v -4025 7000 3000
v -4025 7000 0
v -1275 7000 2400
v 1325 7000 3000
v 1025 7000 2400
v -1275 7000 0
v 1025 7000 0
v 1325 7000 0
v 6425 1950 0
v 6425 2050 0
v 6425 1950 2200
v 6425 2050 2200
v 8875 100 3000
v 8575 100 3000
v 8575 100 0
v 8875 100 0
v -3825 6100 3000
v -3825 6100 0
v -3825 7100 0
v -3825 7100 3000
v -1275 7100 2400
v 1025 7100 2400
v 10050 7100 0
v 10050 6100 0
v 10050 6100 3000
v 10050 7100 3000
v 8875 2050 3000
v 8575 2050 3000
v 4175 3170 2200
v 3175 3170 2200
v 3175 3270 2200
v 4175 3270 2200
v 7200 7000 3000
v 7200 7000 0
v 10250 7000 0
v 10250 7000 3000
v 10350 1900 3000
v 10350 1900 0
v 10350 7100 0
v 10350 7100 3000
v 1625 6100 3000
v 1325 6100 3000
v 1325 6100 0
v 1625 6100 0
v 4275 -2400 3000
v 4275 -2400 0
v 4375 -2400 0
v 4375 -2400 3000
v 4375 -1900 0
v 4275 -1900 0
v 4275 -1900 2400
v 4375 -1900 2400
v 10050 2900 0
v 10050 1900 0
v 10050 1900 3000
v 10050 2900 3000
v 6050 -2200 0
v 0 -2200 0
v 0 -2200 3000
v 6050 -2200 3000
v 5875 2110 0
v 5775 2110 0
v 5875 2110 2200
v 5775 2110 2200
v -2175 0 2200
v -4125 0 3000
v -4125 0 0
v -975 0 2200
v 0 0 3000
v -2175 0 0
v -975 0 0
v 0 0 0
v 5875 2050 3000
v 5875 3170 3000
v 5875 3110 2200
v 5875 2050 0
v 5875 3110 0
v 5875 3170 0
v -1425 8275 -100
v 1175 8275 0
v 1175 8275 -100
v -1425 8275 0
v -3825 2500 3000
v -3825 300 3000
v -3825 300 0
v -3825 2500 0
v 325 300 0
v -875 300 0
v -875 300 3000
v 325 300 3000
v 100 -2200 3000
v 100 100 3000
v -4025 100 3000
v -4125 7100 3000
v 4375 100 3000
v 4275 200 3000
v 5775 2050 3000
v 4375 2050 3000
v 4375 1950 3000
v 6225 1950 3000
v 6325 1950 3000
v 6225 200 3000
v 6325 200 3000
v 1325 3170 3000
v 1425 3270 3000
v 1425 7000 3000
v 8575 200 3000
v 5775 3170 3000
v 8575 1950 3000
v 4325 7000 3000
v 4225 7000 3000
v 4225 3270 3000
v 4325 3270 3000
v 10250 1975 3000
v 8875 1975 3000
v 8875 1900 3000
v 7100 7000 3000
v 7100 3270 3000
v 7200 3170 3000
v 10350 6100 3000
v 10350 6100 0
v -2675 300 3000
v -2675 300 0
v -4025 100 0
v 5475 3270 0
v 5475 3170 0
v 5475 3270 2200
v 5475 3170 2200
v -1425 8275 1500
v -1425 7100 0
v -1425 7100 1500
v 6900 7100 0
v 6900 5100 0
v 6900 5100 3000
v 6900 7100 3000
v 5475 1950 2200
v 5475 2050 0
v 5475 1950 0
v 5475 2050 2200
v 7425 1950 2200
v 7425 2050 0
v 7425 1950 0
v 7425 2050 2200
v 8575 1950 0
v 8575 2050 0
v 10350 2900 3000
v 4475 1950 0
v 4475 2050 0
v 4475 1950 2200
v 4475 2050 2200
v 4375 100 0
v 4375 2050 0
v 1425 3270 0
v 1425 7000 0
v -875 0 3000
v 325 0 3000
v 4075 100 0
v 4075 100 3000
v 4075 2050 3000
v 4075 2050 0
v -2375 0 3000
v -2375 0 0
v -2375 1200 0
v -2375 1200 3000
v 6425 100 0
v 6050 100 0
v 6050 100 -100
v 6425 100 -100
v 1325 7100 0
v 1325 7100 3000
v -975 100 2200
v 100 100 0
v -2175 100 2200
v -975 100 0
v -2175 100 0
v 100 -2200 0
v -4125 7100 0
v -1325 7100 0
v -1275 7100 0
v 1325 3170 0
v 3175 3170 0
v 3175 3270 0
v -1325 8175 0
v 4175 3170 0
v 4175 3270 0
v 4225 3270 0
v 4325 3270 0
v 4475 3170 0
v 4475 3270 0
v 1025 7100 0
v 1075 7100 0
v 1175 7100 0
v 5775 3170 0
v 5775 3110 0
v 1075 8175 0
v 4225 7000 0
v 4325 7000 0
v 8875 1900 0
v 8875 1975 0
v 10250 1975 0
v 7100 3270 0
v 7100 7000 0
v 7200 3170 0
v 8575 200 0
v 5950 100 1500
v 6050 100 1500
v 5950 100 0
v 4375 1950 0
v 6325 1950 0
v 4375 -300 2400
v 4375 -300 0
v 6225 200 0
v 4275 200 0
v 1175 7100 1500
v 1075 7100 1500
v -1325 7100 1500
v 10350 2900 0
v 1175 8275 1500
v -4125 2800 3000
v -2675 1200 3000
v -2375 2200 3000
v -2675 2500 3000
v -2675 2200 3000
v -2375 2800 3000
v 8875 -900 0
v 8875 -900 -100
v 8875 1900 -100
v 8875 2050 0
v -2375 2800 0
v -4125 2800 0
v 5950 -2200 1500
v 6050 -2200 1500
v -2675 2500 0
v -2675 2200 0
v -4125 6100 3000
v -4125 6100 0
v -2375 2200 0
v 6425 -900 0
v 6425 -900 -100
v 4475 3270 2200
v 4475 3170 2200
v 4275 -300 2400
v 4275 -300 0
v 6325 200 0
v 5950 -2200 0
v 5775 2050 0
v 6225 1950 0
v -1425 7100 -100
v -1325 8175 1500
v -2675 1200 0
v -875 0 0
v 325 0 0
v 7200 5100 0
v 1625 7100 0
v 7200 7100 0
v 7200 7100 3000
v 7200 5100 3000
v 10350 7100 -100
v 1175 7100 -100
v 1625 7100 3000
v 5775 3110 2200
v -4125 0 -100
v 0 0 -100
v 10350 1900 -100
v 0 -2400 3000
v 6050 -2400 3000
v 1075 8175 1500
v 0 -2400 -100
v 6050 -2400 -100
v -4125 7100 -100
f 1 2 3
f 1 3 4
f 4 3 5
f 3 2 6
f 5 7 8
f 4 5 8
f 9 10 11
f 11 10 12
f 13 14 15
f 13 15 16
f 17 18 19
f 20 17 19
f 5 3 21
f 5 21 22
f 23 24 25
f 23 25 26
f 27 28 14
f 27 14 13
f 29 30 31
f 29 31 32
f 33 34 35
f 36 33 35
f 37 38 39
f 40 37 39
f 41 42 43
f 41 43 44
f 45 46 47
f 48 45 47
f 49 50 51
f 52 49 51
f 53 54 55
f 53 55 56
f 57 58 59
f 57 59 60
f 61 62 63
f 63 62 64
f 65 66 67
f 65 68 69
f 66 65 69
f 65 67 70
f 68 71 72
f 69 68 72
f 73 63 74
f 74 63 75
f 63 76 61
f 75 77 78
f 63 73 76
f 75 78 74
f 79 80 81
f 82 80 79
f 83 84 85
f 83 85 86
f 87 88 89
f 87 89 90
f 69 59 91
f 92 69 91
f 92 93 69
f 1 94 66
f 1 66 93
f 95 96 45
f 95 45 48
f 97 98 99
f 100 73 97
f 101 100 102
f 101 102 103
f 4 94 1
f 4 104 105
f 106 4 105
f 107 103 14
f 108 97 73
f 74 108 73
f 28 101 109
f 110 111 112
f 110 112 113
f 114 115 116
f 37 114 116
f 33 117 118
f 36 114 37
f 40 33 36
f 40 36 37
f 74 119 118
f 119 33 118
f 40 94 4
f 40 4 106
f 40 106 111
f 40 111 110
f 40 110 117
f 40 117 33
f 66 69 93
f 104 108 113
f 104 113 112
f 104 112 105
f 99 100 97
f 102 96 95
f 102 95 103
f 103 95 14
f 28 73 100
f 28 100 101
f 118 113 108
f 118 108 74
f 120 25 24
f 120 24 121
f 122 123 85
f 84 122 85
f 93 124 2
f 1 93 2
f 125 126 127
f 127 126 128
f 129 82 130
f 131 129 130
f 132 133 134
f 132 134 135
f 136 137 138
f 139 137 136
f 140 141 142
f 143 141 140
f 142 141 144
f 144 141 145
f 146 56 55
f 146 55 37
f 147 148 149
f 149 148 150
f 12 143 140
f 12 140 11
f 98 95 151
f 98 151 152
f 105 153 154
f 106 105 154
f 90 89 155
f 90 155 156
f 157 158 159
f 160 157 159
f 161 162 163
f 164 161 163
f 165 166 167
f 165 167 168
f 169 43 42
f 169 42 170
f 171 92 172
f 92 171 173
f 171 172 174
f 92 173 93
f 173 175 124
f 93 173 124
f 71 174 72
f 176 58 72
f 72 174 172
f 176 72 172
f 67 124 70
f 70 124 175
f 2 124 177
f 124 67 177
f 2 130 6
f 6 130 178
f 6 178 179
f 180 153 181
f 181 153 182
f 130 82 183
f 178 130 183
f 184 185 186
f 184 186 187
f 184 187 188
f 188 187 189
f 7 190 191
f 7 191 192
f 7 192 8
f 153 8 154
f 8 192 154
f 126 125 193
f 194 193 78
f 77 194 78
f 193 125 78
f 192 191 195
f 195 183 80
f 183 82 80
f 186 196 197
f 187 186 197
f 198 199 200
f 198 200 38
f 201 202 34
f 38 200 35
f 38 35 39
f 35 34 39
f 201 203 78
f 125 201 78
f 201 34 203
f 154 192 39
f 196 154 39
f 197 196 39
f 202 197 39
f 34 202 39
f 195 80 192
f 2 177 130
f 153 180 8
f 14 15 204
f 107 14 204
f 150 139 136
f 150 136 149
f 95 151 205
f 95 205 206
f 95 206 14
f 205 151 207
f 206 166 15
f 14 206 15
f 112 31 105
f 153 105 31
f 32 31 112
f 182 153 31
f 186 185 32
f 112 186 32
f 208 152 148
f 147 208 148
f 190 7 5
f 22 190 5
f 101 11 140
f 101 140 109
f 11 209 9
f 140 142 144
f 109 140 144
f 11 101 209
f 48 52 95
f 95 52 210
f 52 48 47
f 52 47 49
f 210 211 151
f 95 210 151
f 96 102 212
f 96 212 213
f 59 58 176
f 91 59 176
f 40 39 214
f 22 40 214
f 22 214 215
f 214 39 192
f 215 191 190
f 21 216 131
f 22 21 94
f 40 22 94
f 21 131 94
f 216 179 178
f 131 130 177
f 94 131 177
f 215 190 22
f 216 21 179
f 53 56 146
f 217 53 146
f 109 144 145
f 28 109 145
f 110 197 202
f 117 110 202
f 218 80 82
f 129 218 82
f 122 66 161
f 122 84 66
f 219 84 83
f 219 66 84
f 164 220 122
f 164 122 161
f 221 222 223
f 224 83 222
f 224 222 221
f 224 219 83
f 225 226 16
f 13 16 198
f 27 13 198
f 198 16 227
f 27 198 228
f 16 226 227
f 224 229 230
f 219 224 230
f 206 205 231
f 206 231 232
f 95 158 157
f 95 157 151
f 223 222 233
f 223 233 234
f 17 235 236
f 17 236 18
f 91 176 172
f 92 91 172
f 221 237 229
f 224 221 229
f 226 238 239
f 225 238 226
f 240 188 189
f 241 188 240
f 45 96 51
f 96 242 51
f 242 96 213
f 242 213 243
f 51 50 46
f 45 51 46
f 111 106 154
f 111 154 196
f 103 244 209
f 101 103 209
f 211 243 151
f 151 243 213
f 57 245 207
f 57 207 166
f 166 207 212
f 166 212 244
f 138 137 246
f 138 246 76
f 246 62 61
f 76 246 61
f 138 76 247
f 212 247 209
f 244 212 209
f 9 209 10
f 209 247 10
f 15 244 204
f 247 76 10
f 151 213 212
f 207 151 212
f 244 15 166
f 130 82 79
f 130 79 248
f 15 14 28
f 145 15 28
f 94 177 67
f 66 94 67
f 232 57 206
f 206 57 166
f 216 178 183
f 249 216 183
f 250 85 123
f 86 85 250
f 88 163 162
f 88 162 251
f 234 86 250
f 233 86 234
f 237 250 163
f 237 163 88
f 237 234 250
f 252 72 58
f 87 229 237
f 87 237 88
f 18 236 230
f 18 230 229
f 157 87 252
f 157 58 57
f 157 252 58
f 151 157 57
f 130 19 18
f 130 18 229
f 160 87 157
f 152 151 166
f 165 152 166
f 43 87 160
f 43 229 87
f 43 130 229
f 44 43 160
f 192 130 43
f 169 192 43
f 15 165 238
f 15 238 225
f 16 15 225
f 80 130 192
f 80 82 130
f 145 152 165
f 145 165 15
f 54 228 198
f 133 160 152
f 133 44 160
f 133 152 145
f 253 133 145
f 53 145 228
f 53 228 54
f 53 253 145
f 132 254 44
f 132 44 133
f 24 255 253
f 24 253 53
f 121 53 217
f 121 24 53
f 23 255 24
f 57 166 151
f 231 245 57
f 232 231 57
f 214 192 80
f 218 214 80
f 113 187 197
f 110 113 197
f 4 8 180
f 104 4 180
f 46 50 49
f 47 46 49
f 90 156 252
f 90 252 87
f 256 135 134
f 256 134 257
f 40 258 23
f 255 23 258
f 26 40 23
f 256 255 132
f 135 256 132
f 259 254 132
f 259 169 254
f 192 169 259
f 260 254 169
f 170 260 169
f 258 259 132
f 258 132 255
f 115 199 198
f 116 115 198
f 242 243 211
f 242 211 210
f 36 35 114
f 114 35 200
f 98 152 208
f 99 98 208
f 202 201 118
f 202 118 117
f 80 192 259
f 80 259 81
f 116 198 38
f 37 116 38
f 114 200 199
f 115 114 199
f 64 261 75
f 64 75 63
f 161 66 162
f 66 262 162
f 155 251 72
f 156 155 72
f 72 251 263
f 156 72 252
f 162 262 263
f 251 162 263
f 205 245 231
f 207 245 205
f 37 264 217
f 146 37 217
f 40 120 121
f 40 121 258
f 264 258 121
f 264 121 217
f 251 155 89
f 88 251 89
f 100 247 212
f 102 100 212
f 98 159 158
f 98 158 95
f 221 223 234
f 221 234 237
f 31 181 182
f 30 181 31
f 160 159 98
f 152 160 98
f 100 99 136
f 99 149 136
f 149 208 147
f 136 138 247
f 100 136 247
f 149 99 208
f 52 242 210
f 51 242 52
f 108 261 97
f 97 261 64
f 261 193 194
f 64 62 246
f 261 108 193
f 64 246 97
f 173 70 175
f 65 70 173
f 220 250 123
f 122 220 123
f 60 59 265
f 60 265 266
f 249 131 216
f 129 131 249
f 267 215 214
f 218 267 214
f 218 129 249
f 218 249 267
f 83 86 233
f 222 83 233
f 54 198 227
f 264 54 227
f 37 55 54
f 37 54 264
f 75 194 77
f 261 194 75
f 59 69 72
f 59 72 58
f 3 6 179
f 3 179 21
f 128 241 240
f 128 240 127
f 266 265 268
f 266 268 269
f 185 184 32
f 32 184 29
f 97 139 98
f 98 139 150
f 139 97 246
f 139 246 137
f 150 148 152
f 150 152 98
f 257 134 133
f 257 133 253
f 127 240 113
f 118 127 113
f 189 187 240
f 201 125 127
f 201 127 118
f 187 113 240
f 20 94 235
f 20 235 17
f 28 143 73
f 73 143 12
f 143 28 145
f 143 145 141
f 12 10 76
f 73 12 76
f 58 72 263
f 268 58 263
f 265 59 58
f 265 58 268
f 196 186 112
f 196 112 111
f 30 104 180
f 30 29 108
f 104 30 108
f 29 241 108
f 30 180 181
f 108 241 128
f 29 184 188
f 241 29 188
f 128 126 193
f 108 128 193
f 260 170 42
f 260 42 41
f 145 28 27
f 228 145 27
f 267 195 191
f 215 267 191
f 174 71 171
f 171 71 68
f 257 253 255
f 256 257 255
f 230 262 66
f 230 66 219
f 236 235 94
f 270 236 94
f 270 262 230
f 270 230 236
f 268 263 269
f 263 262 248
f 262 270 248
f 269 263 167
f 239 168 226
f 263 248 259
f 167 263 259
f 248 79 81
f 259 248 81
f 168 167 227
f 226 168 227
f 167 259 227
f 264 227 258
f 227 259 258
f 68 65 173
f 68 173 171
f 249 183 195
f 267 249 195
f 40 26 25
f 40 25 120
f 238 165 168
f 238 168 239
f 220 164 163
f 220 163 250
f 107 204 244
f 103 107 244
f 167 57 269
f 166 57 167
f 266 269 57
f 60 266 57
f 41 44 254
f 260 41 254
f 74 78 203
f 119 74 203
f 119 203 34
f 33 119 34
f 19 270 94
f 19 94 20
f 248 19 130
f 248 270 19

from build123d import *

# Parameters (mm, degrees)
F1_DEPTH  = 100
F3_DEPTH  = 3000
F4_W      = 300
F4_H      = 1000
F4_H_2    = 2000
F4_H_3    = 1950
F4_W_2    = 1200
F4_H_4    = 300
F4_W_3    = 6050
F4_H_5    = 200
F5_DEPTH  = 3000
F6_W      = 2750
F6_H      = 100
F7_DEPTH  = 3000
F8_W      = 2800
F8_H      = 3730
F8_W_2    = 2775
F9_DEPTH  = 3000
F10_W     = 1200
F10_H     = 2200
F11_DEPTH = 100
F12_W     = 1000
F12_H     = 2200
F13_DEPTH = 100
F14_W     = 1000
F14_H     = 2200
F15_DEPTH = 100
F16_W     = 1000
F16_H     = 2200
F17_DEPTH = 100
F18_W     = 1600
F18_H     = 2400
F19_DEPTH = 100
F20_W     = 2300
F20_H     = 2400
F21_DEPTH = 100
F22_W     = 100
F22_H     = 2300
F23_DEPTH = 1500


with BuildPart() as f1:
    # F0 (on Top) → F1 (new body)
    with BuildSketch(Plane.XY):
        Polygon((-4125, 0), (0, 0), (0, -2400), (6050, -2400), (6050, -900), (6050, 0), (6050, 100), (6425, 100), (6425, 0), (6425, -900), (8875, -900), (8875, 1900), (10350, 1900), (10350, 7100), (1175, 7100), (1175, 8275), (-1425, 8275), (-1425, 7100), (-4125, 7100), align=None)
    extrude(amount=-F1_DEPTH)

    # F2 (on face) → F3 (join)
    with BuildSketch(Plane.XY):
        Polygon((-4125, 2800), (-4125, 0), (-2375, 0), (-2375, 1200), (-2675, 1200), (-2675, 300), (-3825, 300), (-3825, 2500), (-2675, 2500), (-2675, 2200), (-2375, 2200), (-2375, 2800), align=None)
    extrude(amount=F3_DEPTH)

    # F4 (on face) → F5 (join)
    with BuildSketch(Plane.XY):
        with Locations((-3975, 6600)):
            Rectangle(F4_W, F4_H)
        with Locations((1475, 6600)):
            Rectangle(F4_W, F4_H)
        with Locations((7050, 6100)):
            Rectangle(F4_W, F4_H_2)
        with Locations((10200, 6600)):
            Rectangle(F4_W, F4_H)
        with Locations((10200, 2400)):
            Rectangle(F4_W, F4_H)
        with Locations((8725, 1075)):
            Rectangle(F4_W, F4_H_3)
        with Locations((4225, 1075)):
            Rectangle(F4_W, F4_H_3)
        with Locations((-275, 150)):
            Rectangle(F4_W_2, F4_H_4)
        with Locations((3025, -2300)):
            Rectangle(F4_W_3, F4_H_5)
    extrude(amount=F5_DEPTH)


with BuildPart() as f7:
    # F6 (on face) → F7 (new body)
    with BuildSketch(Plane.XY):
        Polygon((0, 0), (0, -2200), (100, -2200), (100, 100), (-4025, 100), (-4025, 7000), (-1425, 7000), (-1425, 7100), (-4125, 7100), (-4125, 0), align=None)
        with Locations((-50, 7050)):
            Rectangle(F6_W, F6_H)
    extrude(amount=F7_DEPTH)

    # F8 (on face) → F9 (join)
    with BuildSketch(Plane.XY):
        Polygon((5875, 3170), (7200, 3170), (7200, 7000), (7200, 7100), (1325, 7100), (1325, 3170), (5775, 3170), (5775, 2050), (4375, 2050), (4375, 1950), (6225, 1950), (6225, 200), (4375, 200), (4375, 100), (8575, 100), (8575, 200), (6325, 200), (6325, 1950), (8575, 1950), (8575, 2050), (5875, 2050), align=None)
        with Locations((2825, 5135)):
            Rectangle(F8_W, F8_H, mode=Mode.SUBTRACT)
        with Locations((5712.5, 5135)):
            Rectangle(F8_W_2, F8_H, mode=Mode.SUBTRACT)
        Polygon((7200, 7100), (7200, 7000), (10250, 7000), (10250, 1975), (8875, 1975), (8875, 1900), (10250, 1900), (10350, 1900), (10350, 7000), (10350, 7100), (10250, 7100), align=None)
        Polygon((4375, -2400), (4375, 100), (4375, 200), (4275, 200), (4275, -2400), align=None)
    extrude(amount=F9_DEPTH)

    # F10 (on face) → F11 (cut)
    with BuildSketch(Plane.XZ):
        with Locations((-1575, 1100)):
            Rectangle(F10_W, F10_H)
    extrude(amount=-F11_DEPTH, mode=Mode.SUBTRACT)

    # F12 (on face) → F13 (cut)
    with BuildSketch(Plane.XZ.offset(-3170)):
        with Locations((3675, 1100)):
            Rectangle(F12_W, F12_H)
        with Locations((4975, 1100)):
            Rectangle(F12_W, F12_H)
    extrude(amount=-F13_DEPTH, mode=Mode.SUBTRACT)

    # F14 (on face) → F15 (cut)
    with BuildSketch(Plane(origin=(5775, 0, 0), x_dir=(0, -1, 0), z_dir=(-1, 0, 0))):
        with Locations((-2610, 1100)):
            Rectangle(F14_W, F14_H)
    extrude(amount=-F15_DEPTH, mode=Mode.SUBTRACT)

    # F16 (on face) → F17 (cut)
    with BuildSketch(Plane(origin=(0, 2050, 0), x_dir=(-1, 0, 0), z_dir=(0, 1, 0))):
        with Locations((-4975, 1100)):
            Rectangle(F16_W, F16_H)
        with Locations((-6925, 1100)):
            Rectangle(F16_W, F16_H)
    extrude(amount=-F17_DEPTH, mode=Mode.SUBTRACT)

    # F18 (on face) → F19 (cut)
    with BuildSketch(Plane(origin=(4275, 0, 0), x_dir=(0, -1, 0), z_dir=(-1, 0, 0))):
        with Locations((1100, 1200)):
            Rectangle(F18_W, F18_H)
    extrude(amount=-F19_DEPTH, mode=Mode.SUBTRACT)

    # F20 (on face) → F21 (cut)
    with BuildSketch(Plane.XZ.offset(-7000)):
        with Locations((-125, 1200)):
            Rectangle(F20_W, F20_H)
    extrude(amount=-F21_DEPTH, mode=Mode.SUBTRACT)

    # F22 (on face) → F23 (join)
    with BuildSketch(Plane.XY):
        Polygon((-1425, 8275), (-1425, 7100), (-1325, 7100), (-1325, 8175), (1075, 8175), (1075, 7100), (1175, 7100), (1175, 8275), align=None)
        with Locations((6000, -1050)):
            Rectangle(F22_W, F22_H)
    extrude(amount=F23_DEPTH)


solid = Compound([f1.part, f7.part])
